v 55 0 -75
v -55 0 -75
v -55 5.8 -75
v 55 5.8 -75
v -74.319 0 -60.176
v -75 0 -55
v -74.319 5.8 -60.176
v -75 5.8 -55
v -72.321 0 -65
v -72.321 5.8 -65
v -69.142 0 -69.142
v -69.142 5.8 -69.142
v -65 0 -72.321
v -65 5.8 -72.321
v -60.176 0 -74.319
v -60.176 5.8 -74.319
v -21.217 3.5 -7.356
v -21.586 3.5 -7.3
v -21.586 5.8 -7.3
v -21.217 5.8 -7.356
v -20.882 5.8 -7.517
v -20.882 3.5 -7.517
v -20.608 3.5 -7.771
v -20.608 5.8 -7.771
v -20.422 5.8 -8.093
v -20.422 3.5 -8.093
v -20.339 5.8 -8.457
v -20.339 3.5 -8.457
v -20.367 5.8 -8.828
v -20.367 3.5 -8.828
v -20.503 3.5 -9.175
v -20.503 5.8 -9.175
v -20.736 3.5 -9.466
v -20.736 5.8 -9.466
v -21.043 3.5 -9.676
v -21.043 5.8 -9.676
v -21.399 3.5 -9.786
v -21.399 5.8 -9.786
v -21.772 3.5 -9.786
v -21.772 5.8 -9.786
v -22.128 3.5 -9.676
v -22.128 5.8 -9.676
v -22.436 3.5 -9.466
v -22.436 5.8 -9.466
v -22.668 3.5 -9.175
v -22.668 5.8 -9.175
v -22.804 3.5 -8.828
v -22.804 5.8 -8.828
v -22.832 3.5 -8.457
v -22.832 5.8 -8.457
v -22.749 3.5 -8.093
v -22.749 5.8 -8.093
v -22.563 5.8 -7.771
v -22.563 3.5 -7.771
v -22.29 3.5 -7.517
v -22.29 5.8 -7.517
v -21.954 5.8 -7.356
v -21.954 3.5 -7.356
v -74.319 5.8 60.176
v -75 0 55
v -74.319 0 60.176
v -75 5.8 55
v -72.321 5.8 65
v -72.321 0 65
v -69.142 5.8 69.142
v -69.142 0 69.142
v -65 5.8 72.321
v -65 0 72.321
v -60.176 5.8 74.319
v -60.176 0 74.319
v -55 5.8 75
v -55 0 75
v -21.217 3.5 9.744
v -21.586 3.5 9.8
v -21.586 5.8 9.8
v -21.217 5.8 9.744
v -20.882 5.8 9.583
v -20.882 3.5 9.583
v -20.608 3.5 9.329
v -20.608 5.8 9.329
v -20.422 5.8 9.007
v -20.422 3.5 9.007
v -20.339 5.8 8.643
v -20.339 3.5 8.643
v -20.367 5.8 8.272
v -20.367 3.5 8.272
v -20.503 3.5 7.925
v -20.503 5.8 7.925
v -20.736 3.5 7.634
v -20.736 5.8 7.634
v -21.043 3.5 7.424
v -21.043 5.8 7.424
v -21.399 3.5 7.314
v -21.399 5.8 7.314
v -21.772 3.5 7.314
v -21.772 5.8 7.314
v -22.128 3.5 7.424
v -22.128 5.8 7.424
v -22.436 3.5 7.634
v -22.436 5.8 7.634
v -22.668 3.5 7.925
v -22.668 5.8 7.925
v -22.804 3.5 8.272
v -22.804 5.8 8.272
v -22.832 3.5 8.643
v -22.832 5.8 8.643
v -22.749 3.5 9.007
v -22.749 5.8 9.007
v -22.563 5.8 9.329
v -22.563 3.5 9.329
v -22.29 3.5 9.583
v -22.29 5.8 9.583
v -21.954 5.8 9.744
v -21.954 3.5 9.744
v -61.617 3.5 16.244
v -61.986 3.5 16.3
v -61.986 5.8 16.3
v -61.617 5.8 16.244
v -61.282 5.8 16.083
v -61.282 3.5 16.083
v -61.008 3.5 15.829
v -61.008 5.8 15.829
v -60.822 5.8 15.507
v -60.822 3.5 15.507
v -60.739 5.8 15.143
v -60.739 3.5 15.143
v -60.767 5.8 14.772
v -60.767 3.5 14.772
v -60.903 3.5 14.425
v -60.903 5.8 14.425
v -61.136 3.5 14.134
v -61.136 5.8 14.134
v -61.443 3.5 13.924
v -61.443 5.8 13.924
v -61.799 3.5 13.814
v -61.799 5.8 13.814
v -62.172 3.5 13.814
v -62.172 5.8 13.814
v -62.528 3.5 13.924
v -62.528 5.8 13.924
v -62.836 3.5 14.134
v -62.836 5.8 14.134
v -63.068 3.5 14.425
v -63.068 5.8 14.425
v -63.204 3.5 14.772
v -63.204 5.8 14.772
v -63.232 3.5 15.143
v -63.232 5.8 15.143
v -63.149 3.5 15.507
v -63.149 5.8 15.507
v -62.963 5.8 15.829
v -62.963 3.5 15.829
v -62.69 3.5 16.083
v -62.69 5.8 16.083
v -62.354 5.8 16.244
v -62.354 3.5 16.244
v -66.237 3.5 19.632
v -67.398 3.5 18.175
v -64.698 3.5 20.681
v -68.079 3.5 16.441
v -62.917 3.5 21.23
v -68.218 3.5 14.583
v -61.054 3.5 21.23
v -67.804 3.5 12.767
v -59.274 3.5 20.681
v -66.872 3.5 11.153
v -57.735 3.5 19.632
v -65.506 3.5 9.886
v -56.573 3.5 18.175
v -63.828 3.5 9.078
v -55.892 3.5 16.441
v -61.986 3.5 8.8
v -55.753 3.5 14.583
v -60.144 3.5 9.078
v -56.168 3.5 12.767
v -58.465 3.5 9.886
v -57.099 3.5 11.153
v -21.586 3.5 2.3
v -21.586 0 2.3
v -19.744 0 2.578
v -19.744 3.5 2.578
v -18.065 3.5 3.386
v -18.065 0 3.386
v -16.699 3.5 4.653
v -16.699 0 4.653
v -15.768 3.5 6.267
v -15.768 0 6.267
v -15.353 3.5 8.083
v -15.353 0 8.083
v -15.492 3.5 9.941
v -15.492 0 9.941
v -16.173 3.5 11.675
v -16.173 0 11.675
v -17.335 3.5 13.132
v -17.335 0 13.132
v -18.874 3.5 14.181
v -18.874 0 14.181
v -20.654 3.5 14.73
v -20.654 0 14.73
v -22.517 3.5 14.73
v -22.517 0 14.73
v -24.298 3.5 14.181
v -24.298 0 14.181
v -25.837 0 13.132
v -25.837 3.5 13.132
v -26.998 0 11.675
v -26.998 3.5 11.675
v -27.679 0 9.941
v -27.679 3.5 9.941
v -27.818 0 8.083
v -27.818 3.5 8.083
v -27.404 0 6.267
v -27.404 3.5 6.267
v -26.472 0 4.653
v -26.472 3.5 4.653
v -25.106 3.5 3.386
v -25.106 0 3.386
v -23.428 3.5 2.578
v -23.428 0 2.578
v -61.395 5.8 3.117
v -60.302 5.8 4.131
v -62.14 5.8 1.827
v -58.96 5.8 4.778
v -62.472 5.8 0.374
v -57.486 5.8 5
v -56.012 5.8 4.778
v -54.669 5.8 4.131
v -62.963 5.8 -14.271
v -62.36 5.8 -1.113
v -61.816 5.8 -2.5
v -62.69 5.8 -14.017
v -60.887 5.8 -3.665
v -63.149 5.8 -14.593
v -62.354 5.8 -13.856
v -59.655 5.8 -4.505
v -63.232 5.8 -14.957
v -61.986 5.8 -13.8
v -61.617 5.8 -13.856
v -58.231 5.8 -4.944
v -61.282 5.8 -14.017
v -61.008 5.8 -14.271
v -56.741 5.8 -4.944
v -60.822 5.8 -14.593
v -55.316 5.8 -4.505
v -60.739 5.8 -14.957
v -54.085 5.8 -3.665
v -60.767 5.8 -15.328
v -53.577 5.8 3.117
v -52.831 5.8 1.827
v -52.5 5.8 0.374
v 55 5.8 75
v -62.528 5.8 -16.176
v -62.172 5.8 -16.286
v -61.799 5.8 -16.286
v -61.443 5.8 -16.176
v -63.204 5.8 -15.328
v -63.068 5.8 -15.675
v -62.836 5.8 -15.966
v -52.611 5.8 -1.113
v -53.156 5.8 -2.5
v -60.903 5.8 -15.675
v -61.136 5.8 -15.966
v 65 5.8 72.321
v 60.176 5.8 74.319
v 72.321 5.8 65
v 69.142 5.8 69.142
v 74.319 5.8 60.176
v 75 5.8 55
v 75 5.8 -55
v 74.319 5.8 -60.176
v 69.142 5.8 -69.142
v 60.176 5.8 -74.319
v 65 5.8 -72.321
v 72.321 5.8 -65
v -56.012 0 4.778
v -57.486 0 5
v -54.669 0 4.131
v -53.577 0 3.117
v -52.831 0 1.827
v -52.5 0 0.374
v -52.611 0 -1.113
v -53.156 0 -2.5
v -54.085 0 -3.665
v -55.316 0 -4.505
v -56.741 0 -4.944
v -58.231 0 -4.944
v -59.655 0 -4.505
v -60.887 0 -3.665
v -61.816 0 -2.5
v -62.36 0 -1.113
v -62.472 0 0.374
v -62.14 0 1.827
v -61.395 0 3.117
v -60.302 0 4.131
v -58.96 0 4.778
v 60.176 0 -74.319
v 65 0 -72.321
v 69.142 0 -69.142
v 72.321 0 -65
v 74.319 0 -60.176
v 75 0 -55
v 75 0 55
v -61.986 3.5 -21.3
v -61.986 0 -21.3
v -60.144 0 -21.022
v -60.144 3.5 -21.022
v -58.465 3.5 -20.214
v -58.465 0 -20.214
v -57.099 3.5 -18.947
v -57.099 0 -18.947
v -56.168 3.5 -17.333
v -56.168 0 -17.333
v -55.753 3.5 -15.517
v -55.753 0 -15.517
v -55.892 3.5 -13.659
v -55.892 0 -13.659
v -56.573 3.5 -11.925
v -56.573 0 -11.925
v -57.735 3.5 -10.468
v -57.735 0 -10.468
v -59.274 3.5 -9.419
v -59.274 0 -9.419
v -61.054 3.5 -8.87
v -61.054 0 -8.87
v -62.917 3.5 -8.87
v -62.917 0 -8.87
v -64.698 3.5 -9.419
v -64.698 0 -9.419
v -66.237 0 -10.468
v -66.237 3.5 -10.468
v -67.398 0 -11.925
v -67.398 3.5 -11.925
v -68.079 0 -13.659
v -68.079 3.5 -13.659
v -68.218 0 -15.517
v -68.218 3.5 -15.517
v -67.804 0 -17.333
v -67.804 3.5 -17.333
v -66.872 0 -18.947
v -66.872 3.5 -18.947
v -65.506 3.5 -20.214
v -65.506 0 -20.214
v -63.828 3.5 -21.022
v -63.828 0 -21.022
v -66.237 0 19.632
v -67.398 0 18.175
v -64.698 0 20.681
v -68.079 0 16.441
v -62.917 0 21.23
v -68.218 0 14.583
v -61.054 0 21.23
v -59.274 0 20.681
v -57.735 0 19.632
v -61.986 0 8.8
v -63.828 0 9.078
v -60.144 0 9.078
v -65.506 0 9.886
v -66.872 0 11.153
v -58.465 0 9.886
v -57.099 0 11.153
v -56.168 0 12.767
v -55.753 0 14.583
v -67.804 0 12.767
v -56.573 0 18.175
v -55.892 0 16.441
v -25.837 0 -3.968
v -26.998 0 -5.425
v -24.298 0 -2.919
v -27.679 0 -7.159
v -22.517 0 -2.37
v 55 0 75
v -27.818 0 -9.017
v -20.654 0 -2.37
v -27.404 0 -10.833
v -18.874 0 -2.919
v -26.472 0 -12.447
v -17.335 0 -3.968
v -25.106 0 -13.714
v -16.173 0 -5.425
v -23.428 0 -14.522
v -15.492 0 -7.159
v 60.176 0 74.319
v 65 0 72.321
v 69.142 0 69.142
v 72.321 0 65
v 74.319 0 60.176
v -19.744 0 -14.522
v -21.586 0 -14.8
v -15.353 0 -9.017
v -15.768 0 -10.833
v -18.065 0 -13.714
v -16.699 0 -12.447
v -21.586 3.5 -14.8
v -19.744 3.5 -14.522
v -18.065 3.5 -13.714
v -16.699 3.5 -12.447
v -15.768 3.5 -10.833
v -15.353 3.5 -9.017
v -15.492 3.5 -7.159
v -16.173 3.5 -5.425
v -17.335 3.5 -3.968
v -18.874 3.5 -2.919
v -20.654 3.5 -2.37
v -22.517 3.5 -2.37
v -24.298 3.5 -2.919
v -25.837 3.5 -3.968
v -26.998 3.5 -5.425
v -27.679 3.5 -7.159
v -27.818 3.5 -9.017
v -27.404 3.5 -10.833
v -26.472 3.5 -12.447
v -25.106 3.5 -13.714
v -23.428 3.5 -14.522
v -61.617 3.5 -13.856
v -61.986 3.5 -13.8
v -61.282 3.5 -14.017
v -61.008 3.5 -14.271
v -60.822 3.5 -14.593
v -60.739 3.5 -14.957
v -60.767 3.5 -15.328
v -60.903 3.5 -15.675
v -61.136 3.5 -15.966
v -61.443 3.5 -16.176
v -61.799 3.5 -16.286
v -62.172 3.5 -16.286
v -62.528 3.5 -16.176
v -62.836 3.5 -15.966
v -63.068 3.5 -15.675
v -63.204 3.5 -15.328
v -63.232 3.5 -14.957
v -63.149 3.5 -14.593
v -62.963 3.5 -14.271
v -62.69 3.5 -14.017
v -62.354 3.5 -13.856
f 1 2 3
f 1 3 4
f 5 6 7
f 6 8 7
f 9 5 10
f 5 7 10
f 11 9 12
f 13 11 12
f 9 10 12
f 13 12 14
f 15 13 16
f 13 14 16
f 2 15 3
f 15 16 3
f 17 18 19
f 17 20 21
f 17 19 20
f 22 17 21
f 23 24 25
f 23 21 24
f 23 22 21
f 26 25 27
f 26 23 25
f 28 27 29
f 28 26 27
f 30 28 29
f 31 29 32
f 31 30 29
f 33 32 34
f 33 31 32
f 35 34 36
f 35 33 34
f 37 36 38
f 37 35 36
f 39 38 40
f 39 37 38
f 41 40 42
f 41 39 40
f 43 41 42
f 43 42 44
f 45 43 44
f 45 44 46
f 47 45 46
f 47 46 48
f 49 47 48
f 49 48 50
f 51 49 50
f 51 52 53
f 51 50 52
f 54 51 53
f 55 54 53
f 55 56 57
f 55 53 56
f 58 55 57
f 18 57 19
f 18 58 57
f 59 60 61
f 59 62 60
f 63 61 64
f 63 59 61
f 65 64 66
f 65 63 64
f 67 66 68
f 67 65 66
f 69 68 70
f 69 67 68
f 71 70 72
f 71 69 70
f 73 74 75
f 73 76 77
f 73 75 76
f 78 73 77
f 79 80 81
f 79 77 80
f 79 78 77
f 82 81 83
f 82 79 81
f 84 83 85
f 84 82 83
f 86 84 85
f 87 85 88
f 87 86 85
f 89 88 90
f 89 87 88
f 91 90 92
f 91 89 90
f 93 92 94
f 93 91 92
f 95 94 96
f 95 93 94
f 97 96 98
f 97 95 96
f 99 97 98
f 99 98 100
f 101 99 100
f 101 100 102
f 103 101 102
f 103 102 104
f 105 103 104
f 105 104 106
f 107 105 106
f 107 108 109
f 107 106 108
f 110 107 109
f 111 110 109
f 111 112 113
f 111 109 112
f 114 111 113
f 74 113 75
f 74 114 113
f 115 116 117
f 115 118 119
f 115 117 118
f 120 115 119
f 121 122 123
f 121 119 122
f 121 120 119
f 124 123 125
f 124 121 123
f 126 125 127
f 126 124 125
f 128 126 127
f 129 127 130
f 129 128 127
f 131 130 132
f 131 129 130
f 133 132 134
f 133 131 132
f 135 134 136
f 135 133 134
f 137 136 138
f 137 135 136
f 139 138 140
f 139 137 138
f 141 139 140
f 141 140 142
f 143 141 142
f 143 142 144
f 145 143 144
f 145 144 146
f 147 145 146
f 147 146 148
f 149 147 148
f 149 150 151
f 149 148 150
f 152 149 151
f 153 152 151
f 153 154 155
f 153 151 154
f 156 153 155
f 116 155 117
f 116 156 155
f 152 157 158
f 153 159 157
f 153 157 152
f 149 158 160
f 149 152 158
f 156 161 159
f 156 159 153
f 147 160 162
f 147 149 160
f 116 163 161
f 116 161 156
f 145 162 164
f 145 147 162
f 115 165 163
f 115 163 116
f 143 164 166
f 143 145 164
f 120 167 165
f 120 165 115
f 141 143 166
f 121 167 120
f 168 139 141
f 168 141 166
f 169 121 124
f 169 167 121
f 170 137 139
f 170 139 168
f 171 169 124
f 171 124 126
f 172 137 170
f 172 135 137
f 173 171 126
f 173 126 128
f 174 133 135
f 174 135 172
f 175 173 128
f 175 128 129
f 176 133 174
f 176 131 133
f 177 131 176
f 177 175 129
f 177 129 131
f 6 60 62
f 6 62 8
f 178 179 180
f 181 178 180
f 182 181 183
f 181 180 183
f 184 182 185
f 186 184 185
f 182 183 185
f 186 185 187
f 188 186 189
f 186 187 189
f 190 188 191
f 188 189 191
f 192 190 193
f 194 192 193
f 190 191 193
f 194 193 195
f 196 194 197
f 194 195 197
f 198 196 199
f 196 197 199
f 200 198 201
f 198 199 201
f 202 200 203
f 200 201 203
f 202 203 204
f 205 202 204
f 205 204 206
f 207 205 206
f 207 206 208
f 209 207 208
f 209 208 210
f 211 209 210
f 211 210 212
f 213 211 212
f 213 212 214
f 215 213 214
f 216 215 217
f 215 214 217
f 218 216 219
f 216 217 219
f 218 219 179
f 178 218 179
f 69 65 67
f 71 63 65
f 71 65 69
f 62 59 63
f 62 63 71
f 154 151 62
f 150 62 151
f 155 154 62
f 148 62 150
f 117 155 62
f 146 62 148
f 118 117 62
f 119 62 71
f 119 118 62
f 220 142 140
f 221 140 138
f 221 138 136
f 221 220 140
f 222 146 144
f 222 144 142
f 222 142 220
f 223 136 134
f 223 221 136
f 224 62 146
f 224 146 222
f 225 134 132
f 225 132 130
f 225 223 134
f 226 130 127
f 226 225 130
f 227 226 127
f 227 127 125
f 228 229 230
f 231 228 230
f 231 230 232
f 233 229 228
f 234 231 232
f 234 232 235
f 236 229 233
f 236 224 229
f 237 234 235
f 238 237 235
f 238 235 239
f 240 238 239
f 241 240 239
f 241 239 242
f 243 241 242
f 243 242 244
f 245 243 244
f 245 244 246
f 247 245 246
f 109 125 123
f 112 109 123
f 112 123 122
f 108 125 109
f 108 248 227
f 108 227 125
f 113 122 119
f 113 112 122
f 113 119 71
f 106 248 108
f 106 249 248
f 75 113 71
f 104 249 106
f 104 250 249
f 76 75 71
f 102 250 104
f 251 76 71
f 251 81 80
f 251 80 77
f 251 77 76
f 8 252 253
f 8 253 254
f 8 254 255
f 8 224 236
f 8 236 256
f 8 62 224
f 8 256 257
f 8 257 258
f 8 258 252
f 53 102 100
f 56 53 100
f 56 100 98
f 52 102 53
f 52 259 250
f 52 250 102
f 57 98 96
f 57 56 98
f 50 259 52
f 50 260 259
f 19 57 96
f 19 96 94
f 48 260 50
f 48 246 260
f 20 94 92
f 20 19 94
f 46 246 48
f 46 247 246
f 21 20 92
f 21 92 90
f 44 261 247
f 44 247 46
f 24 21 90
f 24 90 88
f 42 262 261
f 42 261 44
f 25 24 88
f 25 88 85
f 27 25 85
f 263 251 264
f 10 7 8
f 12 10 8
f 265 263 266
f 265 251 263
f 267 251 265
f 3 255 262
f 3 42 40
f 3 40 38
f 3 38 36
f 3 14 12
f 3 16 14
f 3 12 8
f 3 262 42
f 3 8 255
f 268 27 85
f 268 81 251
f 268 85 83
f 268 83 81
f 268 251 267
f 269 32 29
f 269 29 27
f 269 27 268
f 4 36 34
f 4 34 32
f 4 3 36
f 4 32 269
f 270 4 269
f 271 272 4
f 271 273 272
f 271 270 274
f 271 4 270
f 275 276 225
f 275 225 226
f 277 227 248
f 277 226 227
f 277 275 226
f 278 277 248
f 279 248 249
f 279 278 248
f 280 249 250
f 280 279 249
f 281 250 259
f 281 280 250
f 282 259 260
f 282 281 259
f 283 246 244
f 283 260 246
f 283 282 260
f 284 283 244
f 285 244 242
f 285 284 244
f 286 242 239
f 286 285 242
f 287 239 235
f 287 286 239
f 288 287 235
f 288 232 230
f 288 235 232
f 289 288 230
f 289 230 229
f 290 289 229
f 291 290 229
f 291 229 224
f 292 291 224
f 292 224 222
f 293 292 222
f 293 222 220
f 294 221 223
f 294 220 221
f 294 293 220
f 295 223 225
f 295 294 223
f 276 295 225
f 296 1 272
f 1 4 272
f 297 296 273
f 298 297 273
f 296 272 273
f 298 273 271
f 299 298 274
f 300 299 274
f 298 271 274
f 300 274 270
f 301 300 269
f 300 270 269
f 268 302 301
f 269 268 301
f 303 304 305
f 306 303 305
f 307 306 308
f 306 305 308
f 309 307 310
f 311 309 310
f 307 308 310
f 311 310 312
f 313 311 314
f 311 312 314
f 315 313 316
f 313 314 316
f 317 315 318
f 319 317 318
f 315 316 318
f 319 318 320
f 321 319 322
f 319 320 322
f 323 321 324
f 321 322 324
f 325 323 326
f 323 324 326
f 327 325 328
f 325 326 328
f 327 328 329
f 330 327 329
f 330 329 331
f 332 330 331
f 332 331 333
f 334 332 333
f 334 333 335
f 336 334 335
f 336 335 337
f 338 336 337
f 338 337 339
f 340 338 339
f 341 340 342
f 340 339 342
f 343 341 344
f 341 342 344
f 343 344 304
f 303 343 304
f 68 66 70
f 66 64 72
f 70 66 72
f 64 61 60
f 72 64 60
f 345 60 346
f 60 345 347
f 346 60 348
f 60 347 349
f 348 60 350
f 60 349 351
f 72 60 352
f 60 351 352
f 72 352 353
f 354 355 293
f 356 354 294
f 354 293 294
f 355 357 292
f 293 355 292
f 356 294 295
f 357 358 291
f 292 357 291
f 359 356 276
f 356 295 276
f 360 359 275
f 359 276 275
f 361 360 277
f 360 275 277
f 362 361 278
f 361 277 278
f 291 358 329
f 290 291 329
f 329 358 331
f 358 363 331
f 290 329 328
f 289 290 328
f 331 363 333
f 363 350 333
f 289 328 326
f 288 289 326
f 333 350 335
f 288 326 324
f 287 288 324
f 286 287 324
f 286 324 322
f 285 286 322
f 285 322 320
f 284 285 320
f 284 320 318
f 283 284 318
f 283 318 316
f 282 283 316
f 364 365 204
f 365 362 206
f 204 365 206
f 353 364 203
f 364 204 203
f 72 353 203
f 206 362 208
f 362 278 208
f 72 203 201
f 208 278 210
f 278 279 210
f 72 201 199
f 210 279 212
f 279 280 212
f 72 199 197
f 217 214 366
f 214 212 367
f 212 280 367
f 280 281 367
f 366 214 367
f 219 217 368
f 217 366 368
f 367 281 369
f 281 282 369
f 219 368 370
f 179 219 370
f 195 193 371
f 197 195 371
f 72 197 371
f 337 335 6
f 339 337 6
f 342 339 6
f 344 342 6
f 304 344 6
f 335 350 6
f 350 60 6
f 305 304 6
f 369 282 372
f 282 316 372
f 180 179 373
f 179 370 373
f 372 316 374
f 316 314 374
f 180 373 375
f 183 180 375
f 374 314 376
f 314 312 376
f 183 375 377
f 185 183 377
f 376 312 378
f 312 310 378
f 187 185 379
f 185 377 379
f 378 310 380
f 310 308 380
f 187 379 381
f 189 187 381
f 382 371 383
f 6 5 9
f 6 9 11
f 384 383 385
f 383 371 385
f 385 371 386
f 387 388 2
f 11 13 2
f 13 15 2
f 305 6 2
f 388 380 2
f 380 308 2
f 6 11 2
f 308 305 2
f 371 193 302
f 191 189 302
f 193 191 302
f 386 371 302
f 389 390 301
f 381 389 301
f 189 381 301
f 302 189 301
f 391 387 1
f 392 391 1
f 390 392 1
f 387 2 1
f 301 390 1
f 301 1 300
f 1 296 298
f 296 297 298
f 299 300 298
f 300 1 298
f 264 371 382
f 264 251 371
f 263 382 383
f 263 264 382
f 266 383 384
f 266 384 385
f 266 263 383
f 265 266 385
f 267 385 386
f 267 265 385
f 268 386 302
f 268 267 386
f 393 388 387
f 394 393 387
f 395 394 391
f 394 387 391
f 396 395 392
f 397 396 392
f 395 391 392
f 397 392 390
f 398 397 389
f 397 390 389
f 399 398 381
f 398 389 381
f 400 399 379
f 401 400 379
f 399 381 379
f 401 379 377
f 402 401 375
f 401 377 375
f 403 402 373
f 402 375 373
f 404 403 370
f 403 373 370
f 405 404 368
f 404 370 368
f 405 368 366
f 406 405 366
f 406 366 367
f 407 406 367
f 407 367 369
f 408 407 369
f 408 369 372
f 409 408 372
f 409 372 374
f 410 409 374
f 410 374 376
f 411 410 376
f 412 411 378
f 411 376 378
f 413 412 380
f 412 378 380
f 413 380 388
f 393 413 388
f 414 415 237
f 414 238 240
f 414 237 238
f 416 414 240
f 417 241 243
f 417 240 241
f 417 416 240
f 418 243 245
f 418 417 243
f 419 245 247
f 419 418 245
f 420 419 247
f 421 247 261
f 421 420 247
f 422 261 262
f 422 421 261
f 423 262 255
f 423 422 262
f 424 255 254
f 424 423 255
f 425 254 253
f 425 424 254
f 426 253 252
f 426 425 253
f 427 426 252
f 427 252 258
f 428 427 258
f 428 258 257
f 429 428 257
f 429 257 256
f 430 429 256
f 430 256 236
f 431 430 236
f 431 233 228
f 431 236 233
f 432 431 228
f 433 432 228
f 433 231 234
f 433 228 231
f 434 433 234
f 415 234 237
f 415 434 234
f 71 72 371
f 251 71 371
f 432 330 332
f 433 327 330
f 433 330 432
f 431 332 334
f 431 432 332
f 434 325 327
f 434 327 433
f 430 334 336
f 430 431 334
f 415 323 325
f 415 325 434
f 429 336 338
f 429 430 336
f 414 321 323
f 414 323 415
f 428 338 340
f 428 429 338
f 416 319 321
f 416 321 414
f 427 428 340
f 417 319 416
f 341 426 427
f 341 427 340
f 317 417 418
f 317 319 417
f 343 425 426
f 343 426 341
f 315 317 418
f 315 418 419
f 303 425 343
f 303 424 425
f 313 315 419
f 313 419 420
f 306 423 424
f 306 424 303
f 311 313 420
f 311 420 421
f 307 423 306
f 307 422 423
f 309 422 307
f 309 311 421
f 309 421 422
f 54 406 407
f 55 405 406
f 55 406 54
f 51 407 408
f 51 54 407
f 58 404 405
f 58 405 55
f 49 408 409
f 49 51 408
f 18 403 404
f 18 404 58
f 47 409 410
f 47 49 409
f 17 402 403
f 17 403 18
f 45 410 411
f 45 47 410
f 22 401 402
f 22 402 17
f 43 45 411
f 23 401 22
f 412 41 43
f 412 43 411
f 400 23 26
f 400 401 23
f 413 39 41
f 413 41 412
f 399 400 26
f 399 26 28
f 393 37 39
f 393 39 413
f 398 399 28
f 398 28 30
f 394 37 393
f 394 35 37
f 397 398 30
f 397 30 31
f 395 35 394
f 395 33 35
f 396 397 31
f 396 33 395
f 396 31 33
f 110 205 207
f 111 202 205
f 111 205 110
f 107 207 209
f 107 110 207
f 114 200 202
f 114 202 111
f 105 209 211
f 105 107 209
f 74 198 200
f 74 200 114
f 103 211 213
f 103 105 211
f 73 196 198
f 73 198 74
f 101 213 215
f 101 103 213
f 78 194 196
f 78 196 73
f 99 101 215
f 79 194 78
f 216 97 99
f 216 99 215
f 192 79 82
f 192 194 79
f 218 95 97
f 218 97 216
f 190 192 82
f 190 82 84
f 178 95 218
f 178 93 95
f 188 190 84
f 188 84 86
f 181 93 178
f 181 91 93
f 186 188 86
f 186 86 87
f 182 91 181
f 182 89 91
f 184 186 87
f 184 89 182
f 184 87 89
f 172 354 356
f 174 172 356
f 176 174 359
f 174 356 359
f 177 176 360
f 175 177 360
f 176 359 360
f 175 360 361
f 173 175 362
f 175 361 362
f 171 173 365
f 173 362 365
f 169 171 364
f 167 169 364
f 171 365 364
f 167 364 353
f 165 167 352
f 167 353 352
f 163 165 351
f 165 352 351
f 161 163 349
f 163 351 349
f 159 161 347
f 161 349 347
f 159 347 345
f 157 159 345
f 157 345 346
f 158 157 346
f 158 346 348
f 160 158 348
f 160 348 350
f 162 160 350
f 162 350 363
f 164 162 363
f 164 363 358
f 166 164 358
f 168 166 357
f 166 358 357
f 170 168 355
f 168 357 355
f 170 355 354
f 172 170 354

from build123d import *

# Parameters (mm, degrees)
SKETCH1_W               = 150
SKETCH1_H               = 150
BOSS_EXTRUDE1_DEPTH     = 5.8
CUT_EXTRUDE1_DEPTH      = 107.224479288
CUT_EXTRUDE1_DEPTH_BACK = 107.224479288
SKETCH2_R               = 1.25
SKETCH2_R_2             = 5
FILLET1_R               = 20
SKETCH3_R               = 6.25
CUT_EXTRUDE2_DEPTH      = 3.5


with BuildPart() as part:
    # Sketch1 → Boss-Extrude1 (new body)
    with BuildSketch(Plane(origin=(0, 0, 0), x_dir=(1, 0, 0), z_dir=(0, 1, 0))):
        Rectangle(SKETCH1_W, SKETCH1_H)
    extrude(amount=BOSS_EXTRUDE1_DEPTH)

    # Sketch2 → Cut-Extrude1 (cut, two sides: drawn at the far end of the back side and taken through both)
    with BuildSketch(Plane(origin=(0, 5.8, 0), x_dir=(1, 0, 0), z_dir=(0, 1, 0)).offset(-CUT_EXTRUDE1_DEPTH_BACK)):
        with Locations(Location((-61.985746634, -15.05, 0), (0, 0, 270))):
            Circle(SKETCH2_R)
        with Locations(Location((-61.985746634, 15.05, 0), (0, 0, 270))):
            Circle(SKETCH2_R)
        with Locations(Location((-21.585746634, 8.55, 0), (0, 0, 270))):
            Circle(SKETCH2_R)
        with Locations(Location((-21.585746634, -8.55, 0), (0, 0, 270))):
            Circle(SKETCH2_R)
        with Locations(Location((-57.485746634, 0, 0), (0, 0, 270))):
            Circle(SKETCH2_R_2)
    extrude(amount=CUT_EXTRUDE1_DEPTH + CUT_EXTRUDE1_DEPTH_BACK, mode=Mode.SUBTRACT)

    # Fillet1
    fillet1_edges = [part.edges().sort_by_distance(p)[0] for p in [
        (-75, 2.9, -75),
        (75, 2.9, -75),
        (75, 2.9, 75),
        (-75, 2.9, 75),
    ]]
    fillet(fillet1_edges, radius=FILLET1_R)

    # Sketch3 → Cut-Extrude2 (cut)
    with BuildSketch(Plane.XZ):
        with Locations(Location((-21.585746634, -8.55, 0), (0, 0, 270))):
            Circle(SKETCH3_R)
        with Locations(Location((-21.585746634, 8.55, 0), (0, 0, 270))):
            Circle(SKETCH3_R)
        with Locations(Location((-61.985746634, -15.05, 0), (0, 0, 270))):
            Circle(SKETCH3_R)
        with Locations(Location((-61.985746634, 15.05, 0), (0, 0, 270))):
            Circle(SKETCH3_R)
    extrude(amount=-CUT_EXTRUDE2_DEPTH, mode=Mode.SUBTRACT)


solid = part.part
